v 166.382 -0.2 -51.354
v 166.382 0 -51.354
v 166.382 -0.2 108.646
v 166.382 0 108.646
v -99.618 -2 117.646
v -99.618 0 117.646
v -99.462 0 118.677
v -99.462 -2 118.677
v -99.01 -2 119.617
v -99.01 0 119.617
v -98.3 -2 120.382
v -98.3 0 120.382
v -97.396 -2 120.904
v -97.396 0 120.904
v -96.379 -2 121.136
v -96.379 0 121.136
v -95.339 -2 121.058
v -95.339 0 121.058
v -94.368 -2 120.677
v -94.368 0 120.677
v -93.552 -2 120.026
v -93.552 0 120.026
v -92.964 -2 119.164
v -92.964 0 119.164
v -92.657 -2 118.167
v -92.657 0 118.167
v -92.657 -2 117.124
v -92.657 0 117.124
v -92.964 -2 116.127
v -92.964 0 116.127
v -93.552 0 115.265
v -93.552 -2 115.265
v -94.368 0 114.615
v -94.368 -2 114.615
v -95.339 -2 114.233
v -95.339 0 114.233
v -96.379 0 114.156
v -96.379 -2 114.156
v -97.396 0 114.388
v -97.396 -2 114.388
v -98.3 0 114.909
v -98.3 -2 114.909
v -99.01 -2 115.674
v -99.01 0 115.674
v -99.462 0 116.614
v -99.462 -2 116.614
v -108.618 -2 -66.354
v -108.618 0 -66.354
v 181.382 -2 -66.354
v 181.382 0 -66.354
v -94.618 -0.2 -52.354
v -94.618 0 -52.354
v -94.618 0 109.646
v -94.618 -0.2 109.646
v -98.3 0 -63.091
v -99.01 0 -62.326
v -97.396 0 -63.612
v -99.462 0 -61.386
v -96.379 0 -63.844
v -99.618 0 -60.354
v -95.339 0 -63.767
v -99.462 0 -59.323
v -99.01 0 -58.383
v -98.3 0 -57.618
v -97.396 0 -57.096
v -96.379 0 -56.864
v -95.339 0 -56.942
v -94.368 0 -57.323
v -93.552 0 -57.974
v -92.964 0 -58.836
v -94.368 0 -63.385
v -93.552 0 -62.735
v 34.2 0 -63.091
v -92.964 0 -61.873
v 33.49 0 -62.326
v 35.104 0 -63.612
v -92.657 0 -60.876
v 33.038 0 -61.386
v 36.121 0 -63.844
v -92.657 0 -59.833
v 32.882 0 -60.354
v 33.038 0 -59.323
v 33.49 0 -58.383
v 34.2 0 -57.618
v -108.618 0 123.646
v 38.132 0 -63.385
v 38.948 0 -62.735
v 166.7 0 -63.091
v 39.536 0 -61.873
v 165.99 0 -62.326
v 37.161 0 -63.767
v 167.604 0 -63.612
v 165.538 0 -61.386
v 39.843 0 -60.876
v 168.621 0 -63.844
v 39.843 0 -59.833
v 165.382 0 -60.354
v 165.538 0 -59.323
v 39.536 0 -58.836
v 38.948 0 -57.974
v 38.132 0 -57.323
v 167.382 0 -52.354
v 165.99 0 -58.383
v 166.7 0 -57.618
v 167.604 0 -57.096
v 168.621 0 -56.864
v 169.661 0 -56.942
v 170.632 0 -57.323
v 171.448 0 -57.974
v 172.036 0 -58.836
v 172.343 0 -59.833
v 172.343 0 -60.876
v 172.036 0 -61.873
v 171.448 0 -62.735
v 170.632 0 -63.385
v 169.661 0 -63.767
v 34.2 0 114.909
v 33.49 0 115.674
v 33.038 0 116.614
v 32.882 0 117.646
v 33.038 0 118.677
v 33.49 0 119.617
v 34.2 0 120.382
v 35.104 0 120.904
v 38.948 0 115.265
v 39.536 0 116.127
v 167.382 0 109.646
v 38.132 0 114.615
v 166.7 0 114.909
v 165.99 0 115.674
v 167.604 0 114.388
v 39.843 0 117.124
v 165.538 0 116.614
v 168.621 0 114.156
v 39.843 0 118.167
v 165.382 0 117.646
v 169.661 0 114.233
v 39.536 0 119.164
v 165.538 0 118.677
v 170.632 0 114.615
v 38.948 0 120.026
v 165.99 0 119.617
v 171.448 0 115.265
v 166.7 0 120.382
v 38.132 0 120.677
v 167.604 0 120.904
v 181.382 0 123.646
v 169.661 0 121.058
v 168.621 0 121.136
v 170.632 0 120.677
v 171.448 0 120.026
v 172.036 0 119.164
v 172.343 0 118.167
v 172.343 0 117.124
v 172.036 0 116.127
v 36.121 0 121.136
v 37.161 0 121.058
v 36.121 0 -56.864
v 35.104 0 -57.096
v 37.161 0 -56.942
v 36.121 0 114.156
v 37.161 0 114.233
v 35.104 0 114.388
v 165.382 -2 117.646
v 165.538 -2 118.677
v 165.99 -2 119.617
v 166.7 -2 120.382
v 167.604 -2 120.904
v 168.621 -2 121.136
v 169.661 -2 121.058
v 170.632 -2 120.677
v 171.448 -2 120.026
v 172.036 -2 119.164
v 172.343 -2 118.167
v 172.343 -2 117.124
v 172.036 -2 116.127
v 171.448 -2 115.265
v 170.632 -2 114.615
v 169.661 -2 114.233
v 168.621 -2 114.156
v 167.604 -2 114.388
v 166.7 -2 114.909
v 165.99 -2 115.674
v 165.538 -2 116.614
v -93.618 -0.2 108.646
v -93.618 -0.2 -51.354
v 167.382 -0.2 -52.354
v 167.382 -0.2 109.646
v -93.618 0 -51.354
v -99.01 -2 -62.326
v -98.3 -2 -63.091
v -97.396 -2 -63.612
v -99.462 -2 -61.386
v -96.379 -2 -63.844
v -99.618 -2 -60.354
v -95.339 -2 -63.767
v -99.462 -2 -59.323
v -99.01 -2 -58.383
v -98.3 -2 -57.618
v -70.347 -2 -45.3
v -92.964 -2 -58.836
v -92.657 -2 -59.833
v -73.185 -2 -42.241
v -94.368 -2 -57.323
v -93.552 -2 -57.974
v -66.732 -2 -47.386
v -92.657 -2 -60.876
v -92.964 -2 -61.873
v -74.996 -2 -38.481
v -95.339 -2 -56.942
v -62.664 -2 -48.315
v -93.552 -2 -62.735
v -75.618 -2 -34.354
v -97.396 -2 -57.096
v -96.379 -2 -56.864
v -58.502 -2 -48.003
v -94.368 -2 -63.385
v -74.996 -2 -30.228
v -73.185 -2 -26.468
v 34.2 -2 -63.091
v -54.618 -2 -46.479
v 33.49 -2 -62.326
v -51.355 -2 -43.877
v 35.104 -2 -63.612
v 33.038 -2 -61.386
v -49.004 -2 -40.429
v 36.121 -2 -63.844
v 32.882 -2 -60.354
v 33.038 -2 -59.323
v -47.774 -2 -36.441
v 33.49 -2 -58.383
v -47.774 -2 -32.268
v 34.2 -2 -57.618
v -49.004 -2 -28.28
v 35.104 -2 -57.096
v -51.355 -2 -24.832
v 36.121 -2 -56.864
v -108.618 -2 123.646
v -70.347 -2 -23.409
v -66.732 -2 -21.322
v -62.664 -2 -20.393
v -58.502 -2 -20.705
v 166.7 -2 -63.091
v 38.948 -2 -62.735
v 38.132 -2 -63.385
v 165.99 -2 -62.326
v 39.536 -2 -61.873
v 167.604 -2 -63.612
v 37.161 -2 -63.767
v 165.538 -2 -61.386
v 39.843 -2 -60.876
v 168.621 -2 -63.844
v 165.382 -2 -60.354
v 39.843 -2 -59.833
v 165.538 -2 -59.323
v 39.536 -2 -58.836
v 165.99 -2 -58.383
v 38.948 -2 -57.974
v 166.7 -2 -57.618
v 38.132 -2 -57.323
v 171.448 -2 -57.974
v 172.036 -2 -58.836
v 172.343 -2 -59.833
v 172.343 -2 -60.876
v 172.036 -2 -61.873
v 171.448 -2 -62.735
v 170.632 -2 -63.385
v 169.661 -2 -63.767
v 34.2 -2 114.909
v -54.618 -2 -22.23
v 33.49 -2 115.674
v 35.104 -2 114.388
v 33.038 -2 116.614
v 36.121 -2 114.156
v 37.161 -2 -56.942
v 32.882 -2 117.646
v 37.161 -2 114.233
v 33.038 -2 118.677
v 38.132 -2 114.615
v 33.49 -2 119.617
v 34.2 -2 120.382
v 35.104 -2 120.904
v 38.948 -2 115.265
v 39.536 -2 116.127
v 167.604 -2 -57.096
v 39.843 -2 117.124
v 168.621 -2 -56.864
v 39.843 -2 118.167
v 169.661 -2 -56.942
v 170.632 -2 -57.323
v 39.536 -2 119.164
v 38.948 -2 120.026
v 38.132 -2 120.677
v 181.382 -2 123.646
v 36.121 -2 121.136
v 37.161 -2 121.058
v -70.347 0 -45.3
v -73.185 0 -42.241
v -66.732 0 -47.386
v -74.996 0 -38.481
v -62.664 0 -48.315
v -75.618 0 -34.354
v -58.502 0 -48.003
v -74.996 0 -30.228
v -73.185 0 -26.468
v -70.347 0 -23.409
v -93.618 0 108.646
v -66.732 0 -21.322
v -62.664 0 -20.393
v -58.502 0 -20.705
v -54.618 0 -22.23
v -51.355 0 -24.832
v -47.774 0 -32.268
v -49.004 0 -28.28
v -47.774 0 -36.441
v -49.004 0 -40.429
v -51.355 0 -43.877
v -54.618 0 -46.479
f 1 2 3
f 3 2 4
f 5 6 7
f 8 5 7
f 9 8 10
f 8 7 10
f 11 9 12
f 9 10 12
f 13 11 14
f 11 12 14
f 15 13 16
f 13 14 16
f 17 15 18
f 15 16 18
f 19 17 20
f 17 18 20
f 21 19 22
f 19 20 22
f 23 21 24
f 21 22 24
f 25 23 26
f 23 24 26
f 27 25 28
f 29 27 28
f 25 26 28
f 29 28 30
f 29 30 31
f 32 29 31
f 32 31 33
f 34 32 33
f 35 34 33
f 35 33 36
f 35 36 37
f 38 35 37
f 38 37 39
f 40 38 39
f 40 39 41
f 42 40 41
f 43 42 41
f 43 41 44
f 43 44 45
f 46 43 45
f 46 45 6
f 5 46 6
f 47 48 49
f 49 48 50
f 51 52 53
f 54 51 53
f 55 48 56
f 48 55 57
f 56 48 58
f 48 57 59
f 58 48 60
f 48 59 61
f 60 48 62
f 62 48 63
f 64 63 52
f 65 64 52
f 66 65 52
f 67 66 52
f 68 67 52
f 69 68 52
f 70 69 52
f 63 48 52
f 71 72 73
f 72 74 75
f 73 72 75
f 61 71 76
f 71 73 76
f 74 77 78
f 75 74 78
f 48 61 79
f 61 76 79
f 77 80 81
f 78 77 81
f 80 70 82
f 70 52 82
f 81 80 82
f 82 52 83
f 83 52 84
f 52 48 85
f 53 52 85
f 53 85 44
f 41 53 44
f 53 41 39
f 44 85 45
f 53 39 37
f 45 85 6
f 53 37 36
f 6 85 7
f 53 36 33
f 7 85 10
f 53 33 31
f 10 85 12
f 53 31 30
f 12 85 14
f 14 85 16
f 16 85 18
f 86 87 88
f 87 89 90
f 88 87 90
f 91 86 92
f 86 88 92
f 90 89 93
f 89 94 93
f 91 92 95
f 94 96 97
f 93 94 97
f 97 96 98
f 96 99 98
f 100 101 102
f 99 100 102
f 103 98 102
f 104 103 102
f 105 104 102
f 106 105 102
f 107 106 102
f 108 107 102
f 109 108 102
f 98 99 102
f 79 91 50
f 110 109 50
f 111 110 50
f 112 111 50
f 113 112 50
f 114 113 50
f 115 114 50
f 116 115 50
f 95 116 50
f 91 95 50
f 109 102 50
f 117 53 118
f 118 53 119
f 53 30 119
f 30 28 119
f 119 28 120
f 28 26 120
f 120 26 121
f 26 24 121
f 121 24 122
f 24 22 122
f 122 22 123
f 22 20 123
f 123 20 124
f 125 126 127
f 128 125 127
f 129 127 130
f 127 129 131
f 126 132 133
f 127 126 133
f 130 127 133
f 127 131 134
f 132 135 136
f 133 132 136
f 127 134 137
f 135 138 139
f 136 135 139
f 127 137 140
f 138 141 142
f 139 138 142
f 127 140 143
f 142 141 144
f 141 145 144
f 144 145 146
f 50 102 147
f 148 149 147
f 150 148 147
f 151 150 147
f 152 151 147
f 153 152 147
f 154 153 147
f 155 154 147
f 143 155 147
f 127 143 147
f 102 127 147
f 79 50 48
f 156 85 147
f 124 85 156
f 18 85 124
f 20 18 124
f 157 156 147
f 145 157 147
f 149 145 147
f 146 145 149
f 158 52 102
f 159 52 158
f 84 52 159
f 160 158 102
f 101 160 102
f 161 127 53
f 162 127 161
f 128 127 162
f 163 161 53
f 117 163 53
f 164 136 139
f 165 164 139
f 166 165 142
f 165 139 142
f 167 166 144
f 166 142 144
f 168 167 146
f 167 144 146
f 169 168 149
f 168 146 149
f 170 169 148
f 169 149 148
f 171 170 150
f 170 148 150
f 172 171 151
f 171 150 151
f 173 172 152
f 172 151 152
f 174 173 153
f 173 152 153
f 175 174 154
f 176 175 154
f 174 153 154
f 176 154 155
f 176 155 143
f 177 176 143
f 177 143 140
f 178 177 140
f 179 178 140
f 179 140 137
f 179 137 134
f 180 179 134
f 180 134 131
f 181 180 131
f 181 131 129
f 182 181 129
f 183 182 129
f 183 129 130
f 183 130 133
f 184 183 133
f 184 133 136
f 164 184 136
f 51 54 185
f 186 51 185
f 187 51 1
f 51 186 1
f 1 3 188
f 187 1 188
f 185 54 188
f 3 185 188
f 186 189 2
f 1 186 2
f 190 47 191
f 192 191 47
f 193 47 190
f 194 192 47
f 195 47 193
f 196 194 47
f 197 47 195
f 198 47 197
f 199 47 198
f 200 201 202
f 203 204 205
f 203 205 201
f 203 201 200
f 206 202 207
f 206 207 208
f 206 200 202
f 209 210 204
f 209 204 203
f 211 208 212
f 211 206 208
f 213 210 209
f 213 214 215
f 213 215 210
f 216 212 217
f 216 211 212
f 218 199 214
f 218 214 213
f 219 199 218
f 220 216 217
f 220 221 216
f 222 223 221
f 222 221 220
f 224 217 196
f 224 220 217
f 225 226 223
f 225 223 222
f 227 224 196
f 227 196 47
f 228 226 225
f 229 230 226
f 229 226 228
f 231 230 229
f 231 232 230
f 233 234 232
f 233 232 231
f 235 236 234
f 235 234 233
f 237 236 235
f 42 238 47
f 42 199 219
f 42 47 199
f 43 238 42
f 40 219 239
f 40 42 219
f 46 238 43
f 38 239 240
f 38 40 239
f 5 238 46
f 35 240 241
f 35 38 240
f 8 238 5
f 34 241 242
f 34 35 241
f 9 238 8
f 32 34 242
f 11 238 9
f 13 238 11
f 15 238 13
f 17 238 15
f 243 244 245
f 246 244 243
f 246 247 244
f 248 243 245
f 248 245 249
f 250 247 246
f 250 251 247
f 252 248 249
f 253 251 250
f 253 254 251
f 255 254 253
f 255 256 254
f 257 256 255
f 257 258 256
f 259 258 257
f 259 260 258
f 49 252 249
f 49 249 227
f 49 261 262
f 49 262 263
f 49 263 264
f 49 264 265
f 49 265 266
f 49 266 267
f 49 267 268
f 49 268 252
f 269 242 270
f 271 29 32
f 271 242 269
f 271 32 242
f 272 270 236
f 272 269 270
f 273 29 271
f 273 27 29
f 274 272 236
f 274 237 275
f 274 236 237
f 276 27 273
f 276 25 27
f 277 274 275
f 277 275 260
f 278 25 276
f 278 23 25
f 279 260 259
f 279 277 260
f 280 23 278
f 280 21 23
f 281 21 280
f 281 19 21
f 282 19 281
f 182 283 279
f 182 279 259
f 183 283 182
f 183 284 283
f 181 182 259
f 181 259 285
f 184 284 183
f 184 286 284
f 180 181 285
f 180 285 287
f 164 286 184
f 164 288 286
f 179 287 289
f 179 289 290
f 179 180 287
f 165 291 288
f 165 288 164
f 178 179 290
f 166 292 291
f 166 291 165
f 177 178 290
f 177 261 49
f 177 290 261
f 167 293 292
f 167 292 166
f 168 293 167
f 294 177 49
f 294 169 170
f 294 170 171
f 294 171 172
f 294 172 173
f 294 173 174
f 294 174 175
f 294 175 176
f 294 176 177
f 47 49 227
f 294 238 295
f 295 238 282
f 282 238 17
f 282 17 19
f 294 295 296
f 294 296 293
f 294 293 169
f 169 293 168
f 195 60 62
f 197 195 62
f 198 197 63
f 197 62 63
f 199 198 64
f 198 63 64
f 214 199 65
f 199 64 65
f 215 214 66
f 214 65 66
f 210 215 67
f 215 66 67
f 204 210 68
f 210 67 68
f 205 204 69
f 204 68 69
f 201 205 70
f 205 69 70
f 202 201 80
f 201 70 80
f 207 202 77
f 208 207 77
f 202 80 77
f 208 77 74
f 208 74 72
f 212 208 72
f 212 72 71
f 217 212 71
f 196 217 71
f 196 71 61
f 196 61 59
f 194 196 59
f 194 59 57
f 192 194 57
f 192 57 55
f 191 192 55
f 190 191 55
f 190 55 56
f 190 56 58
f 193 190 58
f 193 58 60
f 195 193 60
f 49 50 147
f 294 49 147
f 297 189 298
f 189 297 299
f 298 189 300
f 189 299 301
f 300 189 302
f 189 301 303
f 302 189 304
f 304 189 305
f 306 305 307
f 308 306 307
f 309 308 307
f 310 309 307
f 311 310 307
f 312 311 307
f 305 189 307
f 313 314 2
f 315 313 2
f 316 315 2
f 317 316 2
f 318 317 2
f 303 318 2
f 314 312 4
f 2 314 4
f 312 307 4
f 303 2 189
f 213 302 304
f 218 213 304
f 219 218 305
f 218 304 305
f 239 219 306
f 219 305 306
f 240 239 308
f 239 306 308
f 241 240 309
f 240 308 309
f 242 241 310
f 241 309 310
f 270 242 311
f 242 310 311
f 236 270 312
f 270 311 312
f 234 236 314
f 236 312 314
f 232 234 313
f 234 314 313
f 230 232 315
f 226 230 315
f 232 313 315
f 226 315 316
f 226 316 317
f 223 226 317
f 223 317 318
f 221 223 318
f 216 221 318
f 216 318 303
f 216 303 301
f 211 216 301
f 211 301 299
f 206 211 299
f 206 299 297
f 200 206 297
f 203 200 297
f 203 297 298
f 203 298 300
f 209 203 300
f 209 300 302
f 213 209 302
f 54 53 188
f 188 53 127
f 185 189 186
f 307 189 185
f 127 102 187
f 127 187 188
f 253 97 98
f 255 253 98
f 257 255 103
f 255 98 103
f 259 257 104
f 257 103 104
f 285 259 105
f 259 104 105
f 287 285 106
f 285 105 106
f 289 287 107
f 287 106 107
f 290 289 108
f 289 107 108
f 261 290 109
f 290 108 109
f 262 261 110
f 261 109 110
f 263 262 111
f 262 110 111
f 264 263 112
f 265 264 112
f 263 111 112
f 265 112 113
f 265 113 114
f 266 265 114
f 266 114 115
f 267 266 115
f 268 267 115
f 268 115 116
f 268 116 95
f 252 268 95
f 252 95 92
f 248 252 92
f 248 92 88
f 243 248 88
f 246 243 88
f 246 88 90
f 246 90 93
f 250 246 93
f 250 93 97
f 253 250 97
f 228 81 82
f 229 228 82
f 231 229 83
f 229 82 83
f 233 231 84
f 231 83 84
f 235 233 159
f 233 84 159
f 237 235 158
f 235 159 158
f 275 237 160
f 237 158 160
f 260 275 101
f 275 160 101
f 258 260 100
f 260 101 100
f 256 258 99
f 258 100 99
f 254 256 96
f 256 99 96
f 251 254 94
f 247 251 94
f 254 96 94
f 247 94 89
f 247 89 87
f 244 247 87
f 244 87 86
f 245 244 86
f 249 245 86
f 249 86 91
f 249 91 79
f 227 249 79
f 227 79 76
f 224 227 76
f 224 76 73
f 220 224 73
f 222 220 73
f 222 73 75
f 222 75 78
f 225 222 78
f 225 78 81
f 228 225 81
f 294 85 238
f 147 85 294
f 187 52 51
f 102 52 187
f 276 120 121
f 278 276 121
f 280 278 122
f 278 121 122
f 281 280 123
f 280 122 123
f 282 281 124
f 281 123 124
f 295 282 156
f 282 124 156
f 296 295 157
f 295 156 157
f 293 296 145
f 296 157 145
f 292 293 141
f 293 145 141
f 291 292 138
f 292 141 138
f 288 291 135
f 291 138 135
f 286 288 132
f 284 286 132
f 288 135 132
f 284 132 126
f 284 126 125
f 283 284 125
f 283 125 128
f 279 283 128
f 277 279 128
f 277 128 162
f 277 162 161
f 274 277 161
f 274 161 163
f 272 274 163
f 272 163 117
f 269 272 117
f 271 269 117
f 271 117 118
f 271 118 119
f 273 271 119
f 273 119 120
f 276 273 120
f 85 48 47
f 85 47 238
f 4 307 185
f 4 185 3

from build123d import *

# Parameters (mm, degrees)
F0_W     = 290
F0_H     = 190
F1_DEPTH = 2
F3_D     = 7
F4_W     = 262
F4_H     = 162
F4_W_2   = 260
F4_H_2   = 160
F5_DEPTH = 0.2
F7_D     = 28


with BuildPart() as f1:
    # F0 (on Front) → F1 (new body)
    with BuildSketch(Plane.XZ):
        with Locations((36.382314, 28.64574)):
            Rectangle(F0_W, F0_H)
    extrude(amount=F1_DEPTH)

    # F3 (through all)
    with Locations(Plane.XZ.offset(2)):
        with Locations((-96.117686, 117.64574), (36.382314, 117.64574), (168.882314, 117.64574), (168.882314, -60.35426), (36.382314, -60.35426), (-96.117686, -60.35426)):
            Hole(F3_D / 2)

    # F4 (on face) → F5 (cut)
    with BuildSketch(Plane.XZ):
        with Locations((36.382314, 28.64574)):
            Rectangle(F4_W, F4_H)
        with Locations((36.382314, 28.64574)):
            Rectangle(F4_W_2, F4_H_2, mode=Mode.SUBTRACT)
    extrude(amount=F5_DEPTH, mode=Mode.SUBTRACT)

    # F7 (through all)
    with Locations(Plane.XZ.offset(2)):
        with Locations((-61.617686, -34.35426)):
            Hole(F7_D / 2)


solid = f1.part
